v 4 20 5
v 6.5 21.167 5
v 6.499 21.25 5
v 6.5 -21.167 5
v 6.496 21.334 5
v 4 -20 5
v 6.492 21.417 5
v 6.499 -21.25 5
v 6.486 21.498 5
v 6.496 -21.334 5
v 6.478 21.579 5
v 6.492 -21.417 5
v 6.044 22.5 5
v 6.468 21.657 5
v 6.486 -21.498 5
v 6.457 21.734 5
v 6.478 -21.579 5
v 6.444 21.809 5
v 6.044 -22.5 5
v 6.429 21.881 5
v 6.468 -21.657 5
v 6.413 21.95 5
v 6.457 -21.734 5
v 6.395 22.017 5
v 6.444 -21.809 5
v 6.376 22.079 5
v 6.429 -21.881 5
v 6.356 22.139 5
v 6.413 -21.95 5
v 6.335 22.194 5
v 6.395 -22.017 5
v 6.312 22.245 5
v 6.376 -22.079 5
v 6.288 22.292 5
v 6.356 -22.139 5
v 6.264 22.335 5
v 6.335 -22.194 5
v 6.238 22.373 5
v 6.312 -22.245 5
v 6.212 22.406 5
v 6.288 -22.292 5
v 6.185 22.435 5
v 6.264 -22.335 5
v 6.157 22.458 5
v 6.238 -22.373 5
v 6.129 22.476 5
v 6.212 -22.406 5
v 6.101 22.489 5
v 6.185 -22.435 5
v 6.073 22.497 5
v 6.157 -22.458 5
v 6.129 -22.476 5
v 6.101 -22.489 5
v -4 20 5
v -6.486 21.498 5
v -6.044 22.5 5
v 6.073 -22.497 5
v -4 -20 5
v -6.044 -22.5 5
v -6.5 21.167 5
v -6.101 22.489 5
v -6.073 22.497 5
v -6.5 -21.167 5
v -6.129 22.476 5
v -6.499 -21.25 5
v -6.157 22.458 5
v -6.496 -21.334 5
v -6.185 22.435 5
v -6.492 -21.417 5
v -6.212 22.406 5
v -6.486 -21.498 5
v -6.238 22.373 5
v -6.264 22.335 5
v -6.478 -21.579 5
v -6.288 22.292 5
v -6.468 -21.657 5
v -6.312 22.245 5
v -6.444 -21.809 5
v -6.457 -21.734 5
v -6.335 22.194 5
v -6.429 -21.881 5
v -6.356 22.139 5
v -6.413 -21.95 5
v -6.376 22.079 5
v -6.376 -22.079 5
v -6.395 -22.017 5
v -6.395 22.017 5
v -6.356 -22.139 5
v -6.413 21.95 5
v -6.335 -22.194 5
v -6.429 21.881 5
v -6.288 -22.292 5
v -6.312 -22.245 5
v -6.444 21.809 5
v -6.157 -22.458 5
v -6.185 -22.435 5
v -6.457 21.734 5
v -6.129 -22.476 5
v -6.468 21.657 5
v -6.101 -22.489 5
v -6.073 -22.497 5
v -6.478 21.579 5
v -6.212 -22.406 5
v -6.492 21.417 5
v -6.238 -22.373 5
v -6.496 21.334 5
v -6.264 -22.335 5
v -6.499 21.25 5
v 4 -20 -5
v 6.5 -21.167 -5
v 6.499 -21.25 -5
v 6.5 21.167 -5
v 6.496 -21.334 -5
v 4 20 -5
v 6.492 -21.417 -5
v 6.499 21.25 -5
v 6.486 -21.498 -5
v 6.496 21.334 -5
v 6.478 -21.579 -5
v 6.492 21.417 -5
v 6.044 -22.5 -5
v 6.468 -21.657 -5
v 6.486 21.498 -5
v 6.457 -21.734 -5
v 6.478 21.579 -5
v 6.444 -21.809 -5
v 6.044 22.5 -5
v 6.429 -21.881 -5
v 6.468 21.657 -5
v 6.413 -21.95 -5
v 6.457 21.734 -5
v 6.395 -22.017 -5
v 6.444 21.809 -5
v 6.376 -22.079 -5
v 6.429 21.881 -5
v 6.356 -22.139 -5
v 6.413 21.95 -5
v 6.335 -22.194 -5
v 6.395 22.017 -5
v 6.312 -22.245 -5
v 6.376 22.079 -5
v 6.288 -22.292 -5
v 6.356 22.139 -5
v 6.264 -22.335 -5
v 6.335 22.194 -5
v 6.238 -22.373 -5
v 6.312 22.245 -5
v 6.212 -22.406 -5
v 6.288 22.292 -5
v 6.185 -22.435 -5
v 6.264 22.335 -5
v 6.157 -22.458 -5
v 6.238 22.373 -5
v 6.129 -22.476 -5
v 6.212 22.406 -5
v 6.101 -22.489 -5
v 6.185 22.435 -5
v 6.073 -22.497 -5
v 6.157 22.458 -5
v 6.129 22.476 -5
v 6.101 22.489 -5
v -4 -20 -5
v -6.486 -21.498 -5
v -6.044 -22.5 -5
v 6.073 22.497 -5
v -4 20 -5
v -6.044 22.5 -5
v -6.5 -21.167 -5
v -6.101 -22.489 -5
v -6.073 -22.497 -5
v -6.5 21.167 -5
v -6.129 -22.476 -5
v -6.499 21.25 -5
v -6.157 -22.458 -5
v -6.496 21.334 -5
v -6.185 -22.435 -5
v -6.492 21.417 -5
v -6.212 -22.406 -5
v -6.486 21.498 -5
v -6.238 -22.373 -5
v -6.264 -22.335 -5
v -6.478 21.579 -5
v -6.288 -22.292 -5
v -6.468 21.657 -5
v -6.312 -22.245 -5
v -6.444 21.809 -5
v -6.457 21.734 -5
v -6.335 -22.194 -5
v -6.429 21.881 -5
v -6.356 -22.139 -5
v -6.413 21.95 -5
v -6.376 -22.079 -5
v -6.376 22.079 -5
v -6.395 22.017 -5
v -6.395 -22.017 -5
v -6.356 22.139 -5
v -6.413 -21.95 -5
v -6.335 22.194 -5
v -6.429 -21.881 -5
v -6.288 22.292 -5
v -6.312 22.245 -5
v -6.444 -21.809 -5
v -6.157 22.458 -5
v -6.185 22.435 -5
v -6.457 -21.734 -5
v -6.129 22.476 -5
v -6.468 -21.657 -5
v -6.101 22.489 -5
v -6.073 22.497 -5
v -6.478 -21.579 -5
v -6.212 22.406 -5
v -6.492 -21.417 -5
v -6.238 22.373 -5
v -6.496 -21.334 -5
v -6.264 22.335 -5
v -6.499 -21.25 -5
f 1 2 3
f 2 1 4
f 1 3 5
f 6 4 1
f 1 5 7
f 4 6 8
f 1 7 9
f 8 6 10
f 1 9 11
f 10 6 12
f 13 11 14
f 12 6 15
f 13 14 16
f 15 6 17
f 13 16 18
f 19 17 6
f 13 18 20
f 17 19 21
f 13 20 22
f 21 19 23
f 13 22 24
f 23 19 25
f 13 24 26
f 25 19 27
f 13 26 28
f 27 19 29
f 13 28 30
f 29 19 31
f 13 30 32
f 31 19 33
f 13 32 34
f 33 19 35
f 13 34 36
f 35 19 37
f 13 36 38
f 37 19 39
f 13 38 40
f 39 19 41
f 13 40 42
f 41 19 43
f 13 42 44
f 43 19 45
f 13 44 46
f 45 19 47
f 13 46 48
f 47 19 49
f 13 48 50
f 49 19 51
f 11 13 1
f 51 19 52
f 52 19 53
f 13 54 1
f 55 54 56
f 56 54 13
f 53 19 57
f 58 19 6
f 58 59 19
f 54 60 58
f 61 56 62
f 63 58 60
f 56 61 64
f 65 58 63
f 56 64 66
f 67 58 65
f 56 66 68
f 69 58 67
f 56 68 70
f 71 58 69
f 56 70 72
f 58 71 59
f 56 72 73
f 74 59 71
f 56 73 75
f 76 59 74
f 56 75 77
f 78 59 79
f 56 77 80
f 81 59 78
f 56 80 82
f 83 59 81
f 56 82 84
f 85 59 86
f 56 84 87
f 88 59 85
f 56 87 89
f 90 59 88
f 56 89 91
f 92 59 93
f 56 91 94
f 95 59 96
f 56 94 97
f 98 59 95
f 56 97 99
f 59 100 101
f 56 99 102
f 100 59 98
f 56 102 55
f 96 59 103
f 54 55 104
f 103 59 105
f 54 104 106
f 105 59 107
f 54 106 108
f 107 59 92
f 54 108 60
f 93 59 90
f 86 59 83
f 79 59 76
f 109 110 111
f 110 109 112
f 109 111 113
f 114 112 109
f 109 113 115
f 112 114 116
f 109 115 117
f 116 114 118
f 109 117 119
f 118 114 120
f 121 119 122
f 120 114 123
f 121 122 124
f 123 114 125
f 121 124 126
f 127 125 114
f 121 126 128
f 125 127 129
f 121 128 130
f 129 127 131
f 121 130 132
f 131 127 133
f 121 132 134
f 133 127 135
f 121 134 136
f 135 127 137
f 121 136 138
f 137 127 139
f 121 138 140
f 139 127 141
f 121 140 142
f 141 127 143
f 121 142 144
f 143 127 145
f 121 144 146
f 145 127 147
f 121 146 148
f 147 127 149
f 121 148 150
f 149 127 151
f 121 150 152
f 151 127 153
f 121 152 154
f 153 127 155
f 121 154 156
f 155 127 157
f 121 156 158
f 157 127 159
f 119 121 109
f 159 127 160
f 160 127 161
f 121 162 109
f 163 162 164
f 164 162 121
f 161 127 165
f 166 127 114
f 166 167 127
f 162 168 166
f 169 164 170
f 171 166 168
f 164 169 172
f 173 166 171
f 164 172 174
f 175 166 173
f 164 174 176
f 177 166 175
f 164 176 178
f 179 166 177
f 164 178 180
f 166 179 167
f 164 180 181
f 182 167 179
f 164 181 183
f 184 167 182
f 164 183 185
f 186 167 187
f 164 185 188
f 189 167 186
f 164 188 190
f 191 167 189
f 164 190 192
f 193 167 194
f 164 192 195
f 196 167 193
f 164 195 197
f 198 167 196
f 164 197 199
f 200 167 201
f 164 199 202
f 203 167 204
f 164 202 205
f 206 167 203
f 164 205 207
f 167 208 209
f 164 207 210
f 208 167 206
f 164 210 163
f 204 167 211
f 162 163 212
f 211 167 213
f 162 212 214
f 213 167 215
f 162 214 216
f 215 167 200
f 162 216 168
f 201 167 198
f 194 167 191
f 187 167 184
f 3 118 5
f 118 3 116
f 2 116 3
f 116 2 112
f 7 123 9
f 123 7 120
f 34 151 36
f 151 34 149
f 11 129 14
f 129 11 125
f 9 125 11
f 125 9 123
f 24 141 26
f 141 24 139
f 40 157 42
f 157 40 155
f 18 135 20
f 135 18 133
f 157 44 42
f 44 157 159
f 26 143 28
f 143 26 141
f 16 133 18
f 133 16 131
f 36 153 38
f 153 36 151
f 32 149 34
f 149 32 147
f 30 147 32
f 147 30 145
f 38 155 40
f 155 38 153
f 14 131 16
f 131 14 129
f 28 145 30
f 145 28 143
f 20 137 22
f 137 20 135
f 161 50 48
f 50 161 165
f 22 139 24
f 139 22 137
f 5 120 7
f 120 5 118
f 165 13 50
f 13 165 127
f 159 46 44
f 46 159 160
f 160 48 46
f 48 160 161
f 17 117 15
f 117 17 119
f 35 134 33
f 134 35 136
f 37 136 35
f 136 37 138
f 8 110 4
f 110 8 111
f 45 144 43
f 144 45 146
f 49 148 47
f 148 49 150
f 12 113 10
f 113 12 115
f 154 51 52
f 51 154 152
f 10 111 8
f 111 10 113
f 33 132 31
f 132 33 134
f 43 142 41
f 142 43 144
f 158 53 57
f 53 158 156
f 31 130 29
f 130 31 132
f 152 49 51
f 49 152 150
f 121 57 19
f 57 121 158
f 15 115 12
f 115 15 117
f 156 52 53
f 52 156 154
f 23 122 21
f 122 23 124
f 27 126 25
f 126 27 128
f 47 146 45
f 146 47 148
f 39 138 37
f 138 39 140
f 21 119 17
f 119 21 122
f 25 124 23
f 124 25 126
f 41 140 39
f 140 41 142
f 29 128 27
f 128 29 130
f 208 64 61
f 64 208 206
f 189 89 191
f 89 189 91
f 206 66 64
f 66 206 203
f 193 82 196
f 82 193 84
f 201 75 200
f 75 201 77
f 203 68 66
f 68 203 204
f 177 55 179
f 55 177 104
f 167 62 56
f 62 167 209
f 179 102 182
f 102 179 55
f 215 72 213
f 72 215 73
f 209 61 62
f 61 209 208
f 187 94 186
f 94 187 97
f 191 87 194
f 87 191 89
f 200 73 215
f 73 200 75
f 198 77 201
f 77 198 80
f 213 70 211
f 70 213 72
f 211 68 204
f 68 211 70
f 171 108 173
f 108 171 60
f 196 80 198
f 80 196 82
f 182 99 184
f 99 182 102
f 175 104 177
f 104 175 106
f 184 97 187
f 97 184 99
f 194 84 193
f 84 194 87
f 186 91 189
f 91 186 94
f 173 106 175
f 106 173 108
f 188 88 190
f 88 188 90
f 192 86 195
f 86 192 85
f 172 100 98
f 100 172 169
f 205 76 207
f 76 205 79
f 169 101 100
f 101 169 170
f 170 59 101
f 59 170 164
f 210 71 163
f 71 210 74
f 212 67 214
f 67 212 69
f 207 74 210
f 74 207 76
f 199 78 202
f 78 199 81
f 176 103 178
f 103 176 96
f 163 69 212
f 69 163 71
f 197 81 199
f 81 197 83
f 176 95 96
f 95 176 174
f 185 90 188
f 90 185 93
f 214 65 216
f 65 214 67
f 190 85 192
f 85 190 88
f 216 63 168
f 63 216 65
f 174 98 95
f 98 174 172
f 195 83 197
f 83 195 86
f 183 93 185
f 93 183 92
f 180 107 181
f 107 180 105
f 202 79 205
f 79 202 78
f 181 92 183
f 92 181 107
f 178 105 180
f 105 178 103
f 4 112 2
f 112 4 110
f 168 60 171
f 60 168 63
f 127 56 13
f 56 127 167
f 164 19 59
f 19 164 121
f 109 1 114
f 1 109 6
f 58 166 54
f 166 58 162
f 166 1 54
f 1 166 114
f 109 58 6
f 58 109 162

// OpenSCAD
// file: ../La_Frite_Case/Scad/Base_Shape_Volume.scad
// Reduce render time in preview
$fn = $preview ? 5 : 100;

// Approximation of measurement
tolerance = 0.4;
aWidth = 57;
aDepth = 67.5;
aHeight = 15;
edgeRadius = 2;

// Draw approximated height and size of Le-Frita board
module innerShape() {
    union() {
        // Corner upper right
        intersection() {
            // Spawn in cube to be sliced
            translate([0,0,0])
            cube([aWidth,aDepth,aHeight],center=true);
            
            translate([aWidth/2 - edgeRadius,aDepth/2- edgeRadius,0])
            cylinder(h=aHeight, r=edgeRadius, center=true);
        }

        // Corner bottom right
        intersection() {
            // Spawn in cube to be sliced
            translate([0,0,0])
            cube([aWidth,aDepth,aHeight],center=true);
            
            translate([aWidth/2 - edgeRadius,-(aDepth/2- edgeRadius),0])
            cylinder(h=aHeight, r=edgeRadius, center=true);
        }

        // Corner upper left
        intersection() {
            // Spawn in cube to be sliced
            translate([0,0,0])
            cube([aWidth,aDepth,aHeight],center=true);
            
            translate([-(aWidth/2 - edgeRadius),aDepth/2 - edgeRadius,0])
            cylinder(h=aHeight, r=edgeRadius, center=true);
        }

        // Corner bottom left
        intersection() {
            // Spawn in cube to be sliced
            translate([0,0,0])
            cube([aWidth,aDepth,aHeight],center=true);
            
            translate([-(aWidth/2 - edgeRadius),-(aDepth/2 - edgeRadius),0])
            cylinder(h=aHeight, r=edgeRadius, center=true);
        }
        
        // Spawn in a smaller cube to fill in
        cube([aWidth,aDepth-edgeRadius*2,aHeight],center=true);
        cube([aWidth-edgeRadius*2,aDepth,aHeight],center=true);
    }
}

// Render
//innerShape();
// main file
// Variables
beltHeight = 10;
perimeterThickness = 2.5;
beltLoopWidth=8;
beltLoopDepth=40;

// Import variables from Base_Shape_Volume.scad
include <../La_Frite_Case/Scad/Base_Shape_Volume.scad>

// Draw perimeter
module perimeter() {
    difference(){
        // Spawn in slightly larger object
        resize([beltLoopWidth+perimeterThickness*2,beltLoopDepth+perimeterThickness*2,beltHeight]) innerShape();
        
        // Cutoff center
        translate([-beltLoopWidth/2,-beltLoopDepth/2,-beltHeight/2]) cube([beltLoopWidth,beltLoopDepth,beltHeight]);
    }
}

perimeter();
